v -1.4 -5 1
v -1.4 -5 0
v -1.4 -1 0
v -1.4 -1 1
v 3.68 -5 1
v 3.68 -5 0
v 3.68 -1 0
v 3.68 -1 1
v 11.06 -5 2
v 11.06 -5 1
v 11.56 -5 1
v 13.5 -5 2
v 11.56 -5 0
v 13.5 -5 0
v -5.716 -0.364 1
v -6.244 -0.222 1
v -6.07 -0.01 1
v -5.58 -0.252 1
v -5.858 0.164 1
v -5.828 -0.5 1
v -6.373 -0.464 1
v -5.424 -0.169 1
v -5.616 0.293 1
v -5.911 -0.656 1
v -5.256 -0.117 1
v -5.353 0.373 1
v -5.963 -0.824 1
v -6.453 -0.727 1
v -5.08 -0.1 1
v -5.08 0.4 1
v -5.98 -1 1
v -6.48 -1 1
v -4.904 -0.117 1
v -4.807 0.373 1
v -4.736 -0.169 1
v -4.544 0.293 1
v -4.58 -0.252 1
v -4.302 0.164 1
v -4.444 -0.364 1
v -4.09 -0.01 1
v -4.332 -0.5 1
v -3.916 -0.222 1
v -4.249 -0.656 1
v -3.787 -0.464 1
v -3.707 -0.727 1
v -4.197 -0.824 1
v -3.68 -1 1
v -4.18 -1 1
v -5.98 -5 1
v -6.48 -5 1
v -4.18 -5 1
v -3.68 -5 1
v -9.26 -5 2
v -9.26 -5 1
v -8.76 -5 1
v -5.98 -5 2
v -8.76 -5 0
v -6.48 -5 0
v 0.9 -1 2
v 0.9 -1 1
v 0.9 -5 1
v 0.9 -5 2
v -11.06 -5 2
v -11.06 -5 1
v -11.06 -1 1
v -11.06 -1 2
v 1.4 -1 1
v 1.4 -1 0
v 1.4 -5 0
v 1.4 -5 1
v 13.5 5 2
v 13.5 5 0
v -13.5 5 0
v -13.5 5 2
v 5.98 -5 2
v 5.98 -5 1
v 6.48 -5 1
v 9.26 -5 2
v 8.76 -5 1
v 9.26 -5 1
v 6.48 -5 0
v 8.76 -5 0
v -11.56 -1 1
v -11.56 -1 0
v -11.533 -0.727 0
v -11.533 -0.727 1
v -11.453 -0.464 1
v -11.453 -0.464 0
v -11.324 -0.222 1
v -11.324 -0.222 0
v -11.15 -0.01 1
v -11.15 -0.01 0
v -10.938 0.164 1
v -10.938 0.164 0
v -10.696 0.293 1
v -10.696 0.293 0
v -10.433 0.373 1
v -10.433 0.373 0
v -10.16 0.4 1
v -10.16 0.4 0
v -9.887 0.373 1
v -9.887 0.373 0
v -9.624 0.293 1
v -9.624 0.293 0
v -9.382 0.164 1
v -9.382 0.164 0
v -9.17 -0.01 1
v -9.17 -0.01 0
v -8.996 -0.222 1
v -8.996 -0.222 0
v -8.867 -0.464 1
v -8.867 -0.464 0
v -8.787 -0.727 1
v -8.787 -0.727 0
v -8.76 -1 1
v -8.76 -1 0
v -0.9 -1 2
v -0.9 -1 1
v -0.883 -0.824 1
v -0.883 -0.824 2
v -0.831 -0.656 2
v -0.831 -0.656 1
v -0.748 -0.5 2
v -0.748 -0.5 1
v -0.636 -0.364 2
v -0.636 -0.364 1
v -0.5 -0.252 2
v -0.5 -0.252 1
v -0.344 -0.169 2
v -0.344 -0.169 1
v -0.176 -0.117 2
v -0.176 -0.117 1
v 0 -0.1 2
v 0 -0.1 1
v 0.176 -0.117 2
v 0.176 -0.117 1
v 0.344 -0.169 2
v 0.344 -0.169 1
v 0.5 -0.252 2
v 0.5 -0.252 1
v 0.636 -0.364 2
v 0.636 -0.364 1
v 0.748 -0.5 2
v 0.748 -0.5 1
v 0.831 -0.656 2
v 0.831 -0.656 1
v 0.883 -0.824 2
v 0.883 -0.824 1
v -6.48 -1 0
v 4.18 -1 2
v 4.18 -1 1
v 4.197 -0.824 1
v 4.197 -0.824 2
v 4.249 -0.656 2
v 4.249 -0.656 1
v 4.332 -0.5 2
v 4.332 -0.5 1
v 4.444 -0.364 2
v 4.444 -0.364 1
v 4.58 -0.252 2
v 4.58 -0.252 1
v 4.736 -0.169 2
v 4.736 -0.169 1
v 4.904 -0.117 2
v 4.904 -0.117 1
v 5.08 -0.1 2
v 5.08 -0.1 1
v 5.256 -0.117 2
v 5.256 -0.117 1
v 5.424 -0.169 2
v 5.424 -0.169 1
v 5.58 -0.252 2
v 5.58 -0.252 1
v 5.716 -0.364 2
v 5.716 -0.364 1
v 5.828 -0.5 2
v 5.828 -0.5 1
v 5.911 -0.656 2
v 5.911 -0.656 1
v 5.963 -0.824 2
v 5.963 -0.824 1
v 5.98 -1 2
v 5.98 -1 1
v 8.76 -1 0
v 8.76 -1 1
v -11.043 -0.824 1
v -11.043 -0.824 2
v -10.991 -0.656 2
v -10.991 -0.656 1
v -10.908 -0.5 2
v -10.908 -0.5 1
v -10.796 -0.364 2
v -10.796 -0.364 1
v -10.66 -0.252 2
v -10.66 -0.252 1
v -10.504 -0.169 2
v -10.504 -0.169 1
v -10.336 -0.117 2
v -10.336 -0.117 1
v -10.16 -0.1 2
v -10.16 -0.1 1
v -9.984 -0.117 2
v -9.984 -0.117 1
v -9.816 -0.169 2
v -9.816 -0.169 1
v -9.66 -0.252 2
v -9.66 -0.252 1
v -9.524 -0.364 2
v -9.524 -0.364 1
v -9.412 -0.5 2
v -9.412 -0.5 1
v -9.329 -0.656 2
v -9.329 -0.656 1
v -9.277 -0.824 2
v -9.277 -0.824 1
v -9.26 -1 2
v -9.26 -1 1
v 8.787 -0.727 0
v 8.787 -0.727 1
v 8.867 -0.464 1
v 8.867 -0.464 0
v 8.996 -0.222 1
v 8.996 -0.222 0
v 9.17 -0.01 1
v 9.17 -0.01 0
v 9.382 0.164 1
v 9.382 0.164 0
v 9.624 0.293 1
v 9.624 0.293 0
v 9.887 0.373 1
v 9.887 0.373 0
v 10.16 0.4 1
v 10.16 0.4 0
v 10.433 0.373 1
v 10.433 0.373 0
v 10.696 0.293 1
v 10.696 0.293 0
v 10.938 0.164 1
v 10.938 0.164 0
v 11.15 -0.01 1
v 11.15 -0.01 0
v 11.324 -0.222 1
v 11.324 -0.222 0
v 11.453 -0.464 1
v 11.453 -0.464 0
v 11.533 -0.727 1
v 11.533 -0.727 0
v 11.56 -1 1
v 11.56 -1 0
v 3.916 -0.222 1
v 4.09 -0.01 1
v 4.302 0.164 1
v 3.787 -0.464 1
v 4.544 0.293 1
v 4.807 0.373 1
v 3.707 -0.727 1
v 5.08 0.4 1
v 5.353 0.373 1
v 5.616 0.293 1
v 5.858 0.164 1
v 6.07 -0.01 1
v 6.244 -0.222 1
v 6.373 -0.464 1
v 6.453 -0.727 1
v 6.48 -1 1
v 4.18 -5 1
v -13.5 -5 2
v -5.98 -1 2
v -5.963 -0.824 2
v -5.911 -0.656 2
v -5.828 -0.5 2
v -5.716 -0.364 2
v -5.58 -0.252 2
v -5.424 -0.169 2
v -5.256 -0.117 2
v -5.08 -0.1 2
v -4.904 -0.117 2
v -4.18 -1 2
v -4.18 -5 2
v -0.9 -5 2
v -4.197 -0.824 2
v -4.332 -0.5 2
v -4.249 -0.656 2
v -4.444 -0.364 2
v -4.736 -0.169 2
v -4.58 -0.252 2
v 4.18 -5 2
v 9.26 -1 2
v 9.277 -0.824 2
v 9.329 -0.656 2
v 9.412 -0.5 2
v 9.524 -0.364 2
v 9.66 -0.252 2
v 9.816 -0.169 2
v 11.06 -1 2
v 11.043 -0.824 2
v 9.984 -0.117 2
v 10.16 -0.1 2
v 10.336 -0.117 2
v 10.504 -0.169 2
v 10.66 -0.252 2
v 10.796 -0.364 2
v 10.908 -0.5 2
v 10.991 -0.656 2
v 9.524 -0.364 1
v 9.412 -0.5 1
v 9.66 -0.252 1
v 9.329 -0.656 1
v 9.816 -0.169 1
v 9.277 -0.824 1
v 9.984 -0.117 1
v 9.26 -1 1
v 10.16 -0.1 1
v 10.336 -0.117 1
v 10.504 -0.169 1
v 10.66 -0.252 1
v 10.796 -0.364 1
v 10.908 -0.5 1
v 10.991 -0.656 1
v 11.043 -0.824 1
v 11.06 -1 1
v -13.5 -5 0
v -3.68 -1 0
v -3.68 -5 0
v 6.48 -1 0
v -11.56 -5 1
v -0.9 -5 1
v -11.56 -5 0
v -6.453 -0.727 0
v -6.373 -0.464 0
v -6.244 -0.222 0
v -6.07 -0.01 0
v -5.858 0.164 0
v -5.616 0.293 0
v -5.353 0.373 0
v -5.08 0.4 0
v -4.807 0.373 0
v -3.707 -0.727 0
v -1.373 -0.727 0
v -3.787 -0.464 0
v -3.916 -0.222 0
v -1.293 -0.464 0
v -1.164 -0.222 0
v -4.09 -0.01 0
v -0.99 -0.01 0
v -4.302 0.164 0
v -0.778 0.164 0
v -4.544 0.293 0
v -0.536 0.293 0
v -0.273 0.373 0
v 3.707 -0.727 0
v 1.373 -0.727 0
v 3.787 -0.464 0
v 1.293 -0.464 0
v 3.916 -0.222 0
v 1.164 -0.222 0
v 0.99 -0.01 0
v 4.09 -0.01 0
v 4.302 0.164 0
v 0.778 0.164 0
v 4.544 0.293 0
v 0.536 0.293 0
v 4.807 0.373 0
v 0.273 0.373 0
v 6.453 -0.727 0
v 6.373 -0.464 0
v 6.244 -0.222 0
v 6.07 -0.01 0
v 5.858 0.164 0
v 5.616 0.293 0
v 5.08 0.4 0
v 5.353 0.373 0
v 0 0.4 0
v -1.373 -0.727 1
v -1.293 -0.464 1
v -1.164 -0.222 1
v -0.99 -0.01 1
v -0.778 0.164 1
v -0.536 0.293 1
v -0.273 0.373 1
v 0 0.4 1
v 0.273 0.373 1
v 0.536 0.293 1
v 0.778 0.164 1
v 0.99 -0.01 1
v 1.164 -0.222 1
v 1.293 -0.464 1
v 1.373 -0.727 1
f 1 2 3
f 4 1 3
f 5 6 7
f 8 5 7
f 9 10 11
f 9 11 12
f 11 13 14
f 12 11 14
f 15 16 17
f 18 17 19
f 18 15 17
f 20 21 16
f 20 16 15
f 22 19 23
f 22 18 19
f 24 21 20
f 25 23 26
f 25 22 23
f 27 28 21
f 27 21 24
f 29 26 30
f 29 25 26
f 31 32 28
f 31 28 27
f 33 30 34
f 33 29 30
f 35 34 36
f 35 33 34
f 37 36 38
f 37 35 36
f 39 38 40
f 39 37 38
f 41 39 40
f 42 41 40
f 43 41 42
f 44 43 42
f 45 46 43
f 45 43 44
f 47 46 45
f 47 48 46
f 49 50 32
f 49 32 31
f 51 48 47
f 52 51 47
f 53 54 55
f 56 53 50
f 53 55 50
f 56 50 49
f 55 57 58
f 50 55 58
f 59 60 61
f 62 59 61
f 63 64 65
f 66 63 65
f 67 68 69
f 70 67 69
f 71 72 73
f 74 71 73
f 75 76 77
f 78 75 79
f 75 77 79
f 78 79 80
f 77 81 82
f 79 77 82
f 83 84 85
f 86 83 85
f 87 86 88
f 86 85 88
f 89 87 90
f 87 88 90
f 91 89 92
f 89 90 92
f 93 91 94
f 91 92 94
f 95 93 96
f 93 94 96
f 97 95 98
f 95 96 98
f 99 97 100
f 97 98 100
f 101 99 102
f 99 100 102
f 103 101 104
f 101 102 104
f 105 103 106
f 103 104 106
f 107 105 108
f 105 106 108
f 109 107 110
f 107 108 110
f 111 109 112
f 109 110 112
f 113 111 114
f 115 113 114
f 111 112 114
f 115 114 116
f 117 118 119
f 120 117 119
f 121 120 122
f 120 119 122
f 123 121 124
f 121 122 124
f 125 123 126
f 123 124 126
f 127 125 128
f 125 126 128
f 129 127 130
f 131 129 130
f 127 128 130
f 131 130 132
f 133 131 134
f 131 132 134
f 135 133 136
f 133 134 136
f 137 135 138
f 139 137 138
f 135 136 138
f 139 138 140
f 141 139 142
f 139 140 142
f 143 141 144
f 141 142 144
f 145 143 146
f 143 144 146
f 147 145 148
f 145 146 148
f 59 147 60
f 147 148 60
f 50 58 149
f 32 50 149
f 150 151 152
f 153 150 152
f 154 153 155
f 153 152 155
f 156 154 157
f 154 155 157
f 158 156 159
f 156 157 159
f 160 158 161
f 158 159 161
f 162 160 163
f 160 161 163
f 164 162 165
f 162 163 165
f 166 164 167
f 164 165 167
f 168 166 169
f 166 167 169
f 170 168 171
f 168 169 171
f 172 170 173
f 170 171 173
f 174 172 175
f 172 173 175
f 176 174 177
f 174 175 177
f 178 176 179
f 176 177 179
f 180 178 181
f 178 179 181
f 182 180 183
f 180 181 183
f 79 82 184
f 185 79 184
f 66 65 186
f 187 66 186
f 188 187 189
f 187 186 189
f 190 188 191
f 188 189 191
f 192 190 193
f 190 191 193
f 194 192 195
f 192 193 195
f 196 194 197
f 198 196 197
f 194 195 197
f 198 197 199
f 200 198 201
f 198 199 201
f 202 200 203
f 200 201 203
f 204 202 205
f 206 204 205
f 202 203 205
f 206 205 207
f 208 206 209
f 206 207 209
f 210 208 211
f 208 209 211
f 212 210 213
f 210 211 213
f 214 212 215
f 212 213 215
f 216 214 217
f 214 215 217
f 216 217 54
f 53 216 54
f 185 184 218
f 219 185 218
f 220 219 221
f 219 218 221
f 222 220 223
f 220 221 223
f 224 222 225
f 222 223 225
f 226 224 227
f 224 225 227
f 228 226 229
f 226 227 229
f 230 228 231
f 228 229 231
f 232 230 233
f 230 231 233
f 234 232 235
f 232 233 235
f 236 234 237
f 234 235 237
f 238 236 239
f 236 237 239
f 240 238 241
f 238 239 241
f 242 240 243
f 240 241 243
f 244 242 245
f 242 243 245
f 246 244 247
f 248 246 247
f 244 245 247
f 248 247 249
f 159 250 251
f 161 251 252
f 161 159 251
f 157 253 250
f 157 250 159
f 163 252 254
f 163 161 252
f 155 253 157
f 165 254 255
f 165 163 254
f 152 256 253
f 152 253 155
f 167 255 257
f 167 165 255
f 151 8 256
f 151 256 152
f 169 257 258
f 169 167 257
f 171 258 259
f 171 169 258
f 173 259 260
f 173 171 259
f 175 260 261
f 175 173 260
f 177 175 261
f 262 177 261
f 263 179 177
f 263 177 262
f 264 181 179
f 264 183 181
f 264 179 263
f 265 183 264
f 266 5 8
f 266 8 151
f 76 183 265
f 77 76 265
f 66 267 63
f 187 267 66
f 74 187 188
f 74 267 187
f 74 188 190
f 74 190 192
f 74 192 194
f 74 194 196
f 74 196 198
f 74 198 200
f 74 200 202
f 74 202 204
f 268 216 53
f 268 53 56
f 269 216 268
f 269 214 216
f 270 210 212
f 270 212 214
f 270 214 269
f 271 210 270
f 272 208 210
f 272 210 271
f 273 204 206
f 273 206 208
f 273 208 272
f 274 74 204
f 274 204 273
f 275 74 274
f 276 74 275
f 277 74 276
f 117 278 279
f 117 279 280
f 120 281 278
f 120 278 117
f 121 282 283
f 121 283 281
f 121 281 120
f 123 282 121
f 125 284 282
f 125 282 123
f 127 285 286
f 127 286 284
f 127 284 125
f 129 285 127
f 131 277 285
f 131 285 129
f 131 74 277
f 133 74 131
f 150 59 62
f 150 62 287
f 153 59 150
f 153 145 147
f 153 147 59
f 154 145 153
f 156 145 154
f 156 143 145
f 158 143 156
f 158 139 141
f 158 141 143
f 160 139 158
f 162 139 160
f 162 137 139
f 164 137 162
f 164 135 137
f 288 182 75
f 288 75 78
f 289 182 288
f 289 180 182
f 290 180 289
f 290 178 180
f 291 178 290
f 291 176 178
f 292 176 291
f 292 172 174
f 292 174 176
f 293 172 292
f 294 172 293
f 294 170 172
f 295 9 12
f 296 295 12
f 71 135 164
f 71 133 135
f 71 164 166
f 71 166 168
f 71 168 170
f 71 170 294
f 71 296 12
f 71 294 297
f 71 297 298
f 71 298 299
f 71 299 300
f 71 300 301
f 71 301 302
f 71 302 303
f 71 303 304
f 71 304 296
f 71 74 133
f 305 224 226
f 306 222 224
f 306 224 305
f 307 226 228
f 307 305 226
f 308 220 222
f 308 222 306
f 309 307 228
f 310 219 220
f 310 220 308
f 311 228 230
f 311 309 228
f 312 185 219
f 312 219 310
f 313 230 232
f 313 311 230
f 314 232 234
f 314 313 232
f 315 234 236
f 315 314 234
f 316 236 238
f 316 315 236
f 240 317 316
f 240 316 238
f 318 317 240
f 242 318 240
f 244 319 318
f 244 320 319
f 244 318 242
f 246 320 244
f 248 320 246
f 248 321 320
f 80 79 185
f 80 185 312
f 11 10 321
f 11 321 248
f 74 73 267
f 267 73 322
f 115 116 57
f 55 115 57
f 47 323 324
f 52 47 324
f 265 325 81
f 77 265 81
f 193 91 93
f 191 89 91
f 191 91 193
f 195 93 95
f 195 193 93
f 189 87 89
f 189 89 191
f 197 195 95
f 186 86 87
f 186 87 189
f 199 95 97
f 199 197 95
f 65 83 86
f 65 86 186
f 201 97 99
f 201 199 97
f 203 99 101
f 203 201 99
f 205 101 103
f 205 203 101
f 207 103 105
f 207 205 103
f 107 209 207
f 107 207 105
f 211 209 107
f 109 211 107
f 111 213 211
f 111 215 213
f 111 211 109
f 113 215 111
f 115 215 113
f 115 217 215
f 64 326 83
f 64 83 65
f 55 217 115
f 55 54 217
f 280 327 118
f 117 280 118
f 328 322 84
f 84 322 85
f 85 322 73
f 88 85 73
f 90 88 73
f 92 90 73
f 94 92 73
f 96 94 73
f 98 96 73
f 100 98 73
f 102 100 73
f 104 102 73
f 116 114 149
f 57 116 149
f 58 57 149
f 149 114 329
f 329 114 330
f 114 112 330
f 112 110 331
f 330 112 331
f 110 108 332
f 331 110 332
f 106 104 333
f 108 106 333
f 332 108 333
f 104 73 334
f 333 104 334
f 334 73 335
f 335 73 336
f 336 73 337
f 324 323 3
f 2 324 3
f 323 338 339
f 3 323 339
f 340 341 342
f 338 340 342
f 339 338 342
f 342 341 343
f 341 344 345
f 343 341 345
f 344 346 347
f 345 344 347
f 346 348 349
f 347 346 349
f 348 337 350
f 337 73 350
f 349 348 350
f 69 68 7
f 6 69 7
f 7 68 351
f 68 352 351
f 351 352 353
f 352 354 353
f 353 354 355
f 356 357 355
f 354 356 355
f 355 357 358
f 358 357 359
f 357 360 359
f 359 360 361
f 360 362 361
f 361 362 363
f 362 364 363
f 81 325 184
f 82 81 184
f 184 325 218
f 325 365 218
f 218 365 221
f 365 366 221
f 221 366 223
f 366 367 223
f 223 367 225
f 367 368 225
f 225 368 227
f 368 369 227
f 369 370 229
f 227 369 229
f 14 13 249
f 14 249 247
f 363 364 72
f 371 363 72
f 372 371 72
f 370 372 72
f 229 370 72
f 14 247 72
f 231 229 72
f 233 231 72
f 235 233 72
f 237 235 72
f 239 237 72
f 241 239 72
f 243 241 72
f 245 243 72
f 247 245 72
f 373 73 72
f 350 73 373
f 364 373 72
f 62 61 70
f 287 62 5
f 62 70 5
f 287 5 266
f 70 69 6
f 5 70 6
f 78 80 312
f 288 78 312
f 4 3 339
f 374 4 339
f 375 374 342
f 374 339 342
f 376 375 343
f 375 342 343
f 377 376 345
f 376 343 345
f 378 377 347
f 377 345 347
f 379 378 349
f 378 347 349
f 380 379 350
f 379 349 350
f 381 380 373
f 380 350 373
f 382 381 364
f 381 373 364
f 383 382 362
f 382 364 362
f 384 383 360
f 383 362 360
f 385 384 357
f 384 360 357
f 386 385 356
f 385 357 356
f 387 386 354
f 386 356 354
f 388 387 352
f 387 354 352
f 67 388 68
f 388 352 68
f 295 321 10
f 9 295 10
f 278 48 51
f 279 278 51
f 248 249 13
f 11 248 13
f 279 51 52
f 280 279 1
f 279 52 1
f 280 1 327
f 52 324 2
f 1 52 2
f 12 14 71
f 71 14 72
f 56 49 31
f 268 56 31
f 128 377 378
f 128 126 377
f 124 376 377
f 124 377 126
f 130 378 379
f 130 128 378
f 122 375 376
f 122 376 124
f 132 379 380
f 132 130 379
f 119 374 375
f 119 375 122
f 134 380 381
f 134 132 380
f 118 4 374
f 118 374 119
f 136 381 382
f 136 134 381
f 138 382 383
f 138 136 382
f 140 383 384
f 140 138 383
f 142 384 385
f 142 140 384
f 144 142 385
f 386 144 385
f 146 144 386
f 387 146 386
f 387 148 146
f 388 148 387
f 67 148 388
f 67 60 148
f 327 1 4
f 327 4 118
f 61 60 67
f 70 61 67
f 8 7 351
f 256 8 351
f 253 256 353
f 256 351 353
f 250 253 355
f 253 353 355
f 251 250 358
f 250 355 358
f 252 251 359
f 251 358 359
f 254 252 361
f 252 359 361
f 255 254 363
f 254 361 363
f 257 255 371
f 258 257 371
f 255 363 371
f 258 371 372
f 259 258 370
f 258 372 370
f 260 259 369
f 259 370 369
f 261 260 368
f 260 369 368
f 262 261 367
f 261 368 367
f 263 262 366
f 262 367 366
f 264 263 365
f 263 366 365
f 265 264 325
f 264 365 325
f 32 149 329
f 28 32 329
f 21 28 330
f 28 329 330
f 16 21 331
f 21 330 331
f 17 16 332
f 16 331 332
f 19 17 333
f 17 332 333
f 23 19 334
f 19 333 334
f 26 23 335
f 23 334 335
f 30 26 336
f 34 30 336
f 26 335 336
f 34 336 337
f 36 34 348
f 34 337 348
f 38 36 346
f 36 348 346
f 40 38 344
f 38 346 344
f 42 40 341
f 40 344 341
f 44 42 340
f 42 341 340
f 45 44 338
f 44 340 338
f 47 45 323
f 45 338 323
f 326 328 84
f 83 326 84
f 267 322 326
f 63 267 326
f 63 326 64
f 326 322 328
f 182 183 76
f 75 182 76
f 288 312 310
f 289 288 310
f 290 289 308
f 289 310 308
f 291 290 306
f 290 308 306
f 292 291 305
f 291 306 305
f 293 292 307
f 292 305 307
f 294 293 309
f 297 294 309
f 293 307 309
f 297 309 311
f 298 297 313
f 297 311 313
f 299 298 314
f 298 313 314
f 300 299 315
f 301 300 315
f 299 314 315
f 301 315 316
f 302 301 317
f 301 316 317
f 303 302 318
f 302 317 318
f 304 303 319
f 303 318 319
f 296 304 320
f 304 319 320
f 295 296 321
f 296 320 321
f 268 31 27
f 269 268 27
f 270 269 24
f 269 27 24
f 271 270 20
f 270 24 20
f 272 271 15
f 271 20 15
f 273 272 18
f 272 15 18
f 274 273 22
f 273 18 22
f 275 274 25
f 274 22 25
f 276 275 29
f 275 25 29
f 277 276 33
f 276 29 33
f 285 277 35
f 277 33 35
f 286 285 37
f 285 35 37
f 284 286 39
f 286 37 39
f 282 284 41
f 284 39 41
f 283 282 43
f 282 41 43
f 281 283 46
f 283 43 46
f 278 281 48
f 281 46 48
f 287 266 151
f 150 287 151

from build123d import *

# Parameters (mm, degrees)
F1_DEPTH = 2
F3_DEPTH = 1


with BuildPart() as f1:
    # F0 (on Top) → F1 (new body)
    with BuildSketch(Plane.XY):
        with BuildLine():
            Line((13.5, 5), (-13.5, 5))
            Line((-13.5, 5), (-13.5, -5))
            Line((-13.5, -5), (-11.06, -5))
            Line((-11.06, -5), (-11.06, -1))
            ThreePointArc((-11.06, -1), (-10.16, -0.1), (-9.26, -1))
            Line((-9.26, -1), (-9.26, -5))
            Line((-9.26, -5), (-5.98, -5))
            Line((-5.98, -5), (-5.98, -1))
            ThreePointArc((-5.98, -1), (-5.08, -0.1), (-4.18, -1))
            Line((-4.18, -1), (-4.18, -5))
            Line((-4.18, -5), (-0.9, -5))
            Line((-0.9, -5), (-0.9, -1))
            ThreePointArc((-0.9, -1), (0, -0.1), (0.9, -1))
            Line((0.9, -1), (0.9, -5))
            Line((0.9, -5), (4.18, -5))
            Line((4.18, -5), (4.18, -1))
            ThreePointArc((4.18, -1), (5.08, -0.1), (5.98, -1))
            Line((5.98, -1), (5.98, -5))
            Line((5.98, -5), (9.26, -5))
            Line((9.26, -5), (9.26, -1))
            ThreePointArc((9.26, -1), (10.16, -0.1), (11.06, -1))
            Line((11.06, -1), (11.06, -5))
            Line((11.06, -5), (13.5, -5))
            Line((13.5, -5), (13.5, 5))
        make_face()
    extrude(amount=F1_DEPTH)

    # F2 (on face) → F3 (cut)
    with BuildSketch(Plane(origin=(0, 0, 0), x_dir=(1, 0, 0), z_dir=(0, 0, -1))):
        with BuildLine():
            Line((-11.56, 6.848881), (-11.56, 5))
            Line((-11.56, 5), (-11.56, 1))
            ThreePointArc((-11.56, 1), (-10.16, -0.4), (-8.76, 1))
            Line((-8.76, 1), (-8.76, 5))
            Line((-8.76, 5), (-6.48, 5))
            Line((-6.48, 5), (-6.48, 1))
            ThreePointArc((-6.48, 1), (-5.08, -0.4), (-3.68, 1))
            Line((-3.68, 1), (-3.68, 5))
            Line((-3.68, 5), (-1.4, 5))
            Line((-1.4, 5), (-1.4, 1))
            ThreePointArc((-1.4, 1), (0, -0.4), (1.4, 1))
            Line((1.4, 1), (1.4, 5))
            Line((1.4, 5), (3.68, 5))
            Line((3.68, 5), (3.68, 1))
            ThreePointArc((3.68, 1), (5.08, -0.4), (6.48, 1))
            Line((6.48, 1), (6.48, 5))
            Line((6.48, 5), (8.76, 5))
            Line((8.76, 5), (8.76, 1))
            ThreePointArc((8.76, 1), (10.16, -0.4), (11.56, 1))
            Line((11.56, 1), (11.56, 5))
            Line((11.56, 5), (11.56, 6.848881))
            Line((11.56, 6.848881), (-11.56, 6.848881))
        make_face()
    extrude(amount=-F3_DEPTH, mode=Mode.SUBTRACT)


solid = f1.part
